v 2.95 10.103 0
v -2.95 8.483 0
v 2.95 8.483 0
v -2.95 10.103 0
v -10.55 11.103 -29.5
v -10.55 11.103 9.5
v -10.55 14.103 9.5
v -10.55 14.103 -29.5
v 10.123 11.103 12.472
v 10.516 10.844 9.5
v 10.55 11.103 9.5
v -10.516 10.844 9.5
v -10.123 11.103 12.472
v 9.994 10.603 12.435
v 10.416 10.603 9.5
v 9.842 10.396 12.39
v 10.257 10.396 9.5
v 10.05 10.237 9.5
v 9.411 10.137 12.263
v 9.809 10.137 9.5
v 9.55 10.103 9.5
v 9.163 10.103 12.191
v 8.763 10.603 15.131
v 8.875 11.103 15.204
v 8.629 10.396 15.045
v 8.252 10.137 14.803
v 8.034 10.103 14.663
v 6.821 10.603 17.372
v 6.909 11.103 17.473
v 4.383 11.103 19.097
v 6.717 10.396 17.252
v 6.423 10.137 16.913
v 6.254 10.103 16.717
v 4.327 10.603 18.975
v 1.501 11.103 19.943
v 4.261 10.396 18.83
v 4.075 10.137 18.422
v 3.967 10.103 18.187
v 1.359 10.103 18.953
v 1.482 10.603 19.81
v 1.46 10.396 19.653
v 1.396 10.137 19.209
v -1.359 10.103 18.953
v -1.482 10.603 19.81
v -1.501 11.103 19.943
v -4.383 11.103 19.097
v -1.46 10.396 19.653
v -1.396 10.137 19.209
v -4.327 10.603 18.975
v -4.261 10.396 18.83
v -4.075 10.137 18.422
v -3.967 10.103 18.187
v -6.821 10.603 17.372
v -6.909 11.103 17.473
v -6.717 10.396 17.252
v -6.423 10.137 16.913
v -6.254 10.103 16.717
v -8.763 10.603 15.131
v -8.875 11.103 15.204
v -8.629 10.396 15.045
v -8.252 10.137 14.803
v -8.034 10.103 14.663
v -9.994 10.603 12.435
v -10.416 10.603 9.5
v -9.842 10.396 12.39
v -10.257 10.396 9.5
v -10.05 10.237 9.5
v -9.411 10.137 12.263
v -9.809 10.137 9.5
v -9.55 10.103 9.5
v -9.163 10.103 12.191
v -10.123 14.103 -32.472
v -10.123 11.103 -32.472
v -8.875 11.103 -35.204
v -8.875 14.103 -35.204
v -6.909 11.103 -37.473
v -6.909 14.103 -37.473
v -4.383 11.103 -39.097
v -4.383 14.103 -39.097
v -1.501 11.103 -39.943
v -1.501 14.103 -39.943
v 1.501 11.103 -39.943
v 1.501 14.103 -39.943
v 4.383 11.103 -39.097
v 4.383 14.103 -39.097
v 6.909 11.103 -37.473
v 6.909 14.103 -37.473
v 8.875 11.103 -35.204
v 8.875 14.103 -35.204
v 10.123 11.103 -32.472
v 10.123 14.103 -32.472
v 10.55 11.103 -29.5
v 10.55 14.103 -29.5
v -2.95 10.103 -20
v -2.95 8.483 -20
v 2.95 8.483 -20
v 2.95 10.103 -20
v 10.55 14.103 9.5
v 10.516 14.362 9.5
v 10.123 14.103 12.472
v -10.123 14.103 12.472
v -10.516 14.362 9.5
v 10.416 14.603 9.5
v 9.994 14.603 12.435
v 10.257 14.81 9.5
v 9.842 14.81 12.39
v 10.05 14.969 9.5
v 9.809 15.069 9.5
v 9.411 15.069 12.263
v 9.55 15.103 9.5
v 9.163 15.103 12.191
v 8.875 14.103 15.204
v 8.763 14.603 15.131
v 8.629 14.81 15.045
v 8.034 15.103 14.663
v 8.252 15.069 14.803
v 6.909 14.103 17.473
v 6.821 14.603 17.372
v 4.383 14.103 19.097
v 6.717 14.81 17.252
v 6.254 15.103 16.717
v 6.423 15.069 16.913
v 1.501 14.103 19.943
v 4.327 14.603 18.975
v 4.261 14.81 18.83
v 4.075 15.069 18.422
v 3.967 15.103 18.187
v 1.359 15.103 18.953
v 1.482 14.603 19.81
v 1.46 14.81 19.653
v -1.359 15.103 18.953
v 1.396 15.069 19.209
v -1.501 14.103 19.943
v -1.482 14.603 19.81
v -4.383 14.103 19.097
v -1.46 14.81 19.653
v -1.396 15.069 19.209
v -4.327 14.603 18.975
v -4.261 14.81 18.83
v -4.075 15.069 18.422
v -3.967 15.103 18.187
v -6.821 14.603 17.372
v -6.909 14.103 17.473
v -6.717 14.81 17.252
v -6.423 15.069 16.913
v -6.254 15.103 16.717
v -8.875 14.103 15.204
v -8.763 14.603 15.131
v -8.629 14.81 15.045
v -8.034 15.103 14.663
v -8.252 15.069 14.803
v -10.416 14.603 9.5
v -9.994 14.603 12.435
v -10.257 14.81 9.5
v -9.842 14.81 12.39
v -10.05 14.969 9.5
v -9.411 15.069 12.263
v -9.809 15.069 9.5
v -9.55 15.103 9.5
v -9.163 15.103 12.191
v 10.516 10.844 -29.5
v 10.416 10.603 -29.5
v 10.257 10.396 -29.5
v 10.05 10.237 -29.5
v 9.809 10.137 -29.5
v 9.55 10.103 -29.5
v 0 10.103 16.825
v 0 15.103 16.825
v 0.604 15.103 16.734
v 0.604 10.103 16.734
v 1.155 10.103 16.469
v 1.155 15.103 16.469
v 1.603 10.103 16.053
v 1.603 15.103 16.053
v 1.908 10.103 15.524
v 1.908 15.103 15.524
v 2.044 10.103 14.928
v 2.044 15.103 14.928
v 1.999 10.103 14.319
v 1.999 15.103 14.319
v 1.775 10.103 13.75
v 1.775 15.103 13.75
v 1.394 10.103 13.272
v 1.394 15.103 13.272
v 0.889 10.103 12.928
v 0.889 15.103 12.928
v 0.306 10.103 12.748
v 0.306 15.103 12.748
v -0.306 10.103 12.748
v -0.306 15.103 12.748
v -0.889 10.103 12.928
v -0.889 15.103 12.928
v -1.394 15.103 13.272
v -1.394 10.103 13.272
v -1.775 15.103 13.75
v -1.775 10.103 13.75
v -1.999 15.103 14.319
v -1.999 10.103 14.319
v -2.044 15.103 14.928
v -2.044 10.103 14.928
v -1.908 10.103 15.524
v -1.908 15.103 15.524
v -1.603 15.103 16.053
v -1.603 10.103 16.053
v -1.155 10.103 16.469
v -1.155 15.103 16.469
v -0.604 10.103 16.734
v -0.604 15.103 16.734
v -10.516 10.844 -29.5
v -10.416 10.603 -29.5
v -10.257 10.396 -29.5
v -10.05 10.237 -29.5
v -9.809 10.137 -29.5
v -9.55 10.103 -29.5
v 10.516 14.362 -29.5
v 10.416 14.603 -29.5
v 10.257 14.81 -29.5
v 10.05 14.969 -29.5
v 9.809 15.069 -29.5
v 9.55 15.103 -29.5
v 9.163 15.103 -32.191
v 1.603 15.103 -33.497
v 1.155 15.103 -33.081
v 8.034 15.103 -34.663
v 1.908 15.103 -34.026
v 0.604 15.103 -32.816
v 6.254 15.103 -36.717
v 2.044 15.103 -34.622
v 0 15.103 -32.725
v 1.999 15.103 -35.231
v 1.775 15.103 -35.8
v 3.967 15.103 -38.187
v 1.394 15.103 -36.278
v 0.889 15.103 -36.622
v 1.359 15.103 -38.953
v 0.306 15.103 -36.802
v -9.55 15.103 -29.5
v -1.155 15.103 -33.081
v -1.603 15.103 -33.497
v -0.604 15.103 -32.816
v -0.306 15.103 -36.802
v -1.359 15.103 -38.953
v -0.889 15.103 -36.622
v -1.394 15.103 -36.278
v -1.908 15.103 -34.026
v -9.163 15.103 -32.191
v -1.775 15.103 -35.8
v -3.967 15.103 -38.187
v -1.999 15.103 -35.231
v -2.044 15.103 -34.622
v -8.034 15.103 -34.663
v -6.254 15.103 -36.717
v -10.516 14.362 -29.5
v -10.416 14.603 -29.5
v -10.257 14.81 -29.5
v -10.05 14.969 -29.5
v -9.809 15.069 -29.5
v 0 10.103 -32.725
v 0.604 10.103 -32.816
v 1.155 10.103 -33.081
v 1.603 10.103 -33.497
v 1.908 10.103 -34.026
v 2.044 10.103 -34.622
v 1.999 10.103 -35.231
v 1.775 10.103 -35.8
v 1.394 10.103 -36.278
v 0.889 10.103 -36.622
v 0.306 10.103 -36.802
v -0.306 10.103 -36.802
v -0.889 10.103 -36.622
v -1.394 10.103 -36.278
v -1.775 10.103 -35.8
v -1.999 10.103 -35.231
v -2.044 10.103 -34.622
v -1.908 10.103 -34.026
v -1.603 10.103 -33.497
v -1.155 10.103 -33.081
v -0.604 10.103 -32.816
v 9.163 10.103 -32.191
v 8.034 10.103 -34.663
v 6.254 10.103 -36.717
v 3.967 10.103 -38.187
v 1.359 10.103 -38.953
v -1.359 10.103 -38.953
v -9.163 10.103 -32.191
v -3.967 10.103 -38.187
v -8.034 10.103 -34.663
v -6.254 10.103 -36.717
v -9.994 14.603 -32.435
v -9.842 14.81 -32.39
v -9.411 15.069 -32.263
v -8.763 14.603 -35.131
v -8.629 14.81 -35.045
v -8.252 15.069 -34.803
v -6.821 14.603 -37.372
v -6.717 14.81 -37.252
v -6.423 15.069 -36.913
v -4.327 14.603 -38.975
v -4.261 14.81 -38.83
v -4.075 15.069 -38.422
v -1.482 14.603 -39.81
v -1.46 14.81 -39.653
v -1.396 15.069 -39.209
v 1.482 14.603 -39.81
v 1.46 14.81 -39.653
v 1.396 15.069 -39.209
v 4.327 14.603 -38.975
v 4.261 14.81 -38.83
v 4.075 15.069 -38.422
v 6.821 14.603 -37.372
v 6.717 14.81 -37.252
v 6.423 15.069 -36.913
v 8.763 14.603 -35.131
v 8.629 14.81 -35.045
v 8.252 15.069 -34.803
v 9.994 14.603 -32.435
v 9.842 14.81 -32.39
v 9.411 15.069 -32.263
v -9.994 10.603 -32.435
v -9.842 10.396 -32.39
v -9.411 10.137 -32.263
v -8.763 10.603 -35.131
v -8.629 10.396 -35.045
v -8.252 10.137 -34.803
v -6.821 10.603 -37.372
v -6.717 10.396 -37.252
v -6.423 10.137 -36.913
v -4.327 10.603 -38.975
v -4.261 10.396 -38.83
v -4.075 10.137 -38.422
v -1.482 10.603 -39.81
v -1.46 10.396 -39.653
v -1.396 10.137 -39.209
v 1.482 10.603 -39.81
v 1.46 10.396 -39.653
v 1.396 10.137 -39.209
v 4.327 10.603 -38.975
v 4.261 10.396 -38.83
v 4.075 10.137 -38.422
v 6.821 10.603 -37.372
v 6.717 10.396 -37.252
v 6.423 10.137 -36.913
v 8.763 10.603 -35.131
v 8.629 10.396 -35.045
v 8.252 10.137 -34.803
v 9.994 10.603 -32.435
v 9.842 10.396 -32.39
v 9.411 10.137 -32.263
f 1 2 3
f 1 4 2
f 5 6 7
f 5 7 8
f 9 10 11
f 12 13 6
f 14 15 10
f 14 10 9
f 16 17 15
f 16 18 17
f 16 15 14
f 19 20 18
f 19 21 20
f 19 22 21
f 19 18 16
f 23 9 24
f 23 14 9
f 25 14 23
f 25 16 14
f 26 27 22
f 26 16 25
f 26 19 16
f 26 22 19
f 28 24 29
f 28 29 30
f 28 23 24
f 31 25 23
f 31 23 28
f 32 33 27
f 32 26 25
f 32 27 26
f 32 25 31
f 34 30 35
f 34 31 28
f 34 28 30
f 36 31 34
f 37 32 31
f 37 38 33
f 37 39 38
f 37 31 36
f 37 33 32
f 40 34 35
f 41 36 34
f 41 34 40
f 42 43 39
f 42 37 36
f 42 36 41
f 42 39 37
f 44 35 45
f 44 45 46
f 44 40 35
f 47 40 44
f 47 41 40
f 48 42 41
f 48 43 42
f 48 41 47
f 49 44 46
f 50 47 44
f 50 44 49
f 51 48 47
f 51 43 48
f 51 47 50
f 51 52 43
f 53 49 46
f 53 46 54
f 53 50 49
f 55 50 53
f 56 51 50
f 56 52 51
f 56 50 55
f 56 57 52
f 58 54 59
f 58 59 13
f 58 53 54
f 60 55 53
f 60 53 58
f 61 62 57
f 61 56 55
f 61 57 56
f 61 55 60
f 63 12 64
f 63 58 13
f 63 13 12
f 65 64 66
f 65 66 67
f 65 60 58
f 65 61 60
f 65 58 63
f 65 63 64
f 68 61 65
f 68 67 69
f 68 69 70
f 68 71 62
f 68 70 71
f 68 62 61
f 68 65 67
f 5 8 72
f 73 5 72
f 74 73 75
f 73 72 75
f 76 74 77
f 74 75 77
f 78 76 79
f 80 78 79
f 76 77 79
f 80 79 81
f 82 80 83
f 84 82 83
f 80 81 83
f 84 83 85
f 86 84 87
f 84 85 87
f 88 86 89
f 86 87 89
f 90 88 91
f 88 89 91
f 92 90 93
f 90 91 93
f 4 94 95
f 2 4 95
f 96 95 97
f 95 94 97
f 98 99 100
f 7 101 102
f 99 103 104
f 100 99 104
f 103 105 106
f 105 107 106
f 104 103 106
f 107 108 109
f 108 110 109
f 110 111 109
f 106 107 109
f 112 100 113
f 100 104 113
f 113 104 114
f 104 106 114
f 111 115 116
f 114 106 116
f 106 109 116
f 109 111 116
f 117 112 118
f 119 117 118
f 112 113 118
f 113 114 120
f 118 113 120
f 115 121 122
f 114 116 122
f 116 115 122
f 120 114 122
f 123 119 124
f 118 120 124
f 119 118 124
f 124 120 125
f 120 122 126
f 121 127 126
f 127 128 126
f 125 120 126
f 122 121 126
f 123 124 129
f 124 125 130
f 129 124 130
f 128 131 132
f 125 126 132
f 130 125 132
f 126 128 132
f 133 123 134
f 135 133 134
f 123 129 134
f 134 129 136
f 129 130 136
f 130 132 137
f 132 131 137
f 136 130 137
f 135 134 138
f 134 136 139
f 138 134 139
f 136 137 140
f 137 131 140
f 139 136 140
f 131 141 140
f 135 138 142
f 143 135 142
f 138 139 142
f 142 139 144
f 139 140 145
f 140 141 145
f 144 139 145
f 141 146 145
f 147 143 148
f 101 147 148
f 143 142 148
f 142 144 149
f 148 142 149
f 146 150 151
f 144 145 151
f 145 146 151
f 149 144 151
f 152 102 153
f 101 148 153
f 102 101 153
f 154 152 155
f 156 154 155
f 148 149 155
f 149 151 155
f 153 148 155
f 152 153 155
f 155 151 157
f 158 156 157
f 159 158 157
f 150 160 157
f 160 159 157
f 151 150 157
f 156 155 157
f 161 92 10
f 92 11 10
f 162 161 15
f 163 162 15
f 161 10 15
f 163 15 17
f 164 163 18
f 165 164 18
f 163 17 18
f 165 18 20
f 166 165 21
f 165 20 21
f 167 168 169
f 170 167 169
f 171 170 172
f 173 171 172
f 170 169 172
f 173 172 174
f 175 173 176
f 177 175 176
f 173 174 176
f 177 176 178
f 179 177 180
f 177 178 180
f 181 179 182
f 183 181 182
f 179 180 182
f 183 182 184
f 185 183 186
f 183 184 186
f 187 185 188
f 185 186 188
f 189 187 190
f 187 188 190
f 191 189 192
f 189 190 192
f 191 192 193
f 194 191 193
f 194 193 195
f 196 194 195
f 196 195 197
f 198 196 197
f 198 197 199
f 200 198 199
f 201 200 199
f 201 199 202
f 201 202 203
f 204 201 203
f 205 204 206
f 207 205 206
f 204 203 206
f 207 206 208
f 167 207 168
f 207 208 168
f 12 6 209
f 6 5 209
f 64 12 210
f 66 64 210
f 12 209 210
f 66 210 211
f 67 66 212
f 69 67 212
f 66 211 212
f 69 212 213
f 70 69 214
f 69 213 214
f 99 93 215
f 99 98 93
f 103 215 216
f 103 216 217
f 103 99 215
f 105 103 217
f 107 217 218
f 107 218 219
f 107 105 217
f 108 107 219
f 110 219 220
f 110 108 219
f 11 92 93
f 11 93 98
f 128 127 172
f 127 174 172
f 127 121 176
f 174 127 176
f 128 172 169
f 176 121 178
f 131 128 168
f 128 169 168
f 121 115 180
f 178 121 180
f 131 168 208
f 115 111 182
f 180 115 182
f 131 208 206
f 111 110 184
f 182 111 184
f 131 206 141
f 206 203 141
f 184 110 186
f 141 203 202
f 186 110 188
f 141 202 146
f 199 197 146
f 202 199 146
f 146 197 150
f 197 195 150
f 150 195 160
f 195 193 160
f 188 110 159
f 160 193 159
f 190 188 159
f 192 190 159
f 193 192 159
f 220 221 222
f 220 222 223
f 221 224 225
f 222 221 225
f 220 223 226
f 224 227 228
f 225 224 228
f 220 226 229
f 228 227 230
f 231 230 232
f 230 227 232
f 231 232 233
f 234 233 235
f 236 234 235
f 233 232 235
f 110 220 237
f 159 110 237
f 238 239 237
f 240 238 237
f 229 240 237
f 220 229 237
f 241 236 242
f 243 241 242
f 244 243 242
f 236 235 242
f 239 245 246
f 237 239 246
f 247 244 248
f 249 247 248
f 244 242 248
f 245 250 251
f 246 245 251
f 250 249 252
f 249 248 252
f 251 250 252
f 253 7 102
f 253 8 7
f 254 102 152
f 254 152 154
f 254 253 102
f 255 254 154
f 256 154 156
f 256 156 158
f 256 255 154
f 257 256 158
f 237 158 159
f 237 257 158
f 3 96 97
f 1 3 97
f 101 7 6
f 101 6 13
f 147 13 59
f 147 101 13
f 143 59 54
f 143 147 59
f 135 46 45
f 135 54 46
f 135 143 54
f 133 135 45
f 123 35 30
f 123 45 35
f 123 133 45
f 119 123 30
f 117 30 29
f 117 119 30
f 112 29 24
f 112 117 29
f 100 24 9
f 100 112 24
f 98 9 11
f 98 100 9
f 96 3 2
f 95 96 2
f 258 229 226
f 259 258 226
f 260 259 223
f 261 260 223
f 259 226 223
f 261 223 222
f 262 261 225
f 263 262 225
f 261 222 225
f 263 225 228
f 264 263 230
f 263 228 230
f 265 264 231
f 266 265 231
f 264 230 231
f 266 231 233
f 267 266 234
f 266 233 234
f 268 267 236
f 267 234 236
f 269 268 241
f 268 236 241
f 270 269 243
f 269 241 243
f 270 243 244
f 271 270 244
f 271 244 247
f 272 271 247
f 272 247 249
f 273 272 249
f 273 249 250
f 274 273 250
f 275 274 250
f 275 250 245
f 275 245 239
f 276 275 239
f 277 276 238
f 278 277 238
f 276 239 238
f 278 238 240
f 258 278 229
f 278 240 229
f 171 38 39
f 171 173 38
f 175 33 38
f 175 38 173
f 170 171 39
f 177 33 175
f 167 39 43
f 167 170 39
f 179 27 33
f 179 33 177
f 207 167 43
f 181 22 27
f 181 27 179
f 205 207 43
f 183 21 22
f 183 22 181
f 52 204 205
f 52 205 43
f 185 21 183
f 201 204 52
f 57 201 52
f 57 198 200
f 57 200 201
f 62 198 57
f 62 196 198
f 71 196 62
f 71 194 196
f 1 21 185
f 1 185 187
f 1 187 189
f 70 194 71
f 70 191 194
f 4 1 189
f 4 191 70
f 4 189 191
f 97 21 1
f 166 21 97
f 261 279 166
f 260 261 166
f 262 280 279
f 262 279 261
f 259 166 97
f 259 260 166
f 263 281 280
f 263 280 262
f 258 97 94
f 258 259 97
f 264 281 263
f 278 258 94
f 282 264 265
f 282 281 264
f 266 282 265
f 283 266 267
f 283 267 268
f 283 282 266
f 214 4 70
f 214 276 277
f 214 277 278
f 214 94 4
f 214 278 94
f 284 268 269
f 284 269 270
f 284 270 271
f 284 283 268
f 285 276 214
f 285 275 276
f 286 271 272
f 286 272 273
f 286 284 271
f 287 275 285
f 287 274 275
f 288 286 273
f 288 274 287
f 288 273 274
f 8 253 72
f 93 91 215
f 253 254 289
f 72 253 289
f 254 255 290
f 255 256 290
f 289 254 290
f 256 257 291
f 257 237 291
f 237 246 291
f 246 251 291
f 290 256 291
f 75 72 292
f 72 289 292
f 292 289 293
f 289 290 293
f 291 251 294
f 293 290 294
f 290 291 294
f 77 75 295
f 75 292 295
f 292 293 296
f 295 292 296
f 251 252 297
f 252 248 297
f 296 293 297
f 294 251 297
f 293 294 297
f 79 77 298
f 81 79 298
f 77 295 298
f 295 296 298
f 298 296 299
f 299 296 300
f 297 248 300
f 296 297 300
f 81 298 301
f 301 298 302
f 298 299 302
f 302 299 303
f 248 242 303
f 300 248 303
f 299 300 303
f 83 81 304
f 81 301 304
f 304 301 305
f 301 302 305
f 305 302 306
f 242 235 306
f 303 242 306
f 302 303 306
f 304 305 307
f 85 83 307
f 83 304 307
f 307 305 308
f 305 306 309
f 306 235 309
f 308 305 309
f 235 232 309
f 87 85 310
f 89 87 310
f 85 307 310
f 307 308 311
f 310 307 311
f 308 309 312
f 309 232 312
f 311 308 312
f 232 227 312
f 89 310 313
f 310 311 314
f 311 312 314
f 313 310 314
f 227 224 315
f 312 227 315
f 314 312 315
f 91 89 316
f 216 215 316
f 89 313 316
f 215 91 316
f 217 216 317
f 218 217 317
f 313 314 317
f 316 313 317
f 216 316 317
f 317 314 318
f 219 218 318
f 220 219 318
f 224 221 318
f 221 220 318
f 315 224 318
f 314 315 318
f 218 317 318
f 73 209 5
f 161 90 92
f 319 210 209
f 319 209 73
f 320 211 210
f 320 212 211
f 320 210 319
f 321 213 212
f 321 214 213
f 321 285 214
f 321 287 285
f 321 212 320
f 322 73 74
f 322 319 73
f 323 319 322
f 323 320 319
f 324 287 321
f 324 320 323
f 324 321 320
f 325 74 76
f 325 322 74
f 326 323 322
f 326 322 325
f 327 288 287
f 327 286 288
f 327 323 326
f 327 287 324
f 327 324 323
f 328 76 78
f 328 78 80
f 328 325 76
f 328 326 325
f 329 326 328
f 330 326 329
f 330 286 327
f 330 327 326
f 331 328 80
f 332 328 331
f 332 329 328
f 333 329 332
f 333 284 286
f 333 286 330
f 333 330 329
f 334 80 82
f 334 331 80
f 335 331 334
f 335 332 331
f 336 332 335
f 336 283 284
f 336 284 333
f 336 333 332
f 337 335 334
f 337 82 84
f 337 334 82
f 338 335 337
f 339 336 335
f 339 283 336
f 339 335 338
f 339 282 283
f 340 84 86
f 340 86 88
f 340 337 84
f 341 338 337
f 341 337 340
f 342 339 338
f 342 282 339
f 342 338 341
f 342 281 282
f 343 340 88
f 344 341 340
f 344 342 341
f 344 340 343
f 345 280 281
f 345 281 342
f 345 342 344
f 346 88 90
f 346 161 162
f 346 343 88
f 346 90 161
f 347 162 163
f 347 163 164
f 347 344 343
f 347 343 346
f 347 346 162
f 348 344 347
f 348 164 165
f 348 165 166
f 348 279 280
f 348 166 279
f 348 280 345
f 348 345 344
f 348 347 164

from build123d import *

# Parameters (mm, degrees)
BOSS_EXTRU_1_DEPTH      = 20
CONG_1_R                = 0.5
CONG_2_R                = 1
BOSS_EXTRU_2_DEPTH      = 5
ENL_V_MAT_EXTRU_1_DEPTH = 35.78012648597392
ESQUISSE6_R             = 2.0500000000000007
ESQUISSE6_R_2           = 2.05
BOSS_EXTRU_3_DEPTH      = 5
CONG_4_R                = 1


with BuildPart() as part:
    # Esquisse1 → Boss.-Extru.1 (new body)
    with BuildSketch(Plane.XY):
        Polygon((-1.176e-14, 10.103135382441117), (-2.578e-14, 4.840000000000001), (3.5, 4.840000000000001), (5.71, 6.983135382441116), (5.71, 8.483135382441116), (2.95, 8.483135382441116), (2.95, 10.103135382441117), align=None)
        Polygon((-3.5, 4.840000000000001), (-2.576e-14, 4.840000000000001), (-1.176e-14, 10.103135382441117), (-2.95, 10.103135382441117), (-2.95, 8.483135382441116), (-5.71, 8.483135382441116), (-5.71, 6.983135382441116), align=None)
    extrude(amount=-BOSS_EXTRU_1_DEPTH)

    # Congé1
    cong_1_edges = [part.edges().sort_by_distance(p)[0] for p in [
        (5.71, 7.733135382441116, 0),
        (4.605, 5.911567691220558, 0),
        (0, 4.840000000000001, 0),
        (-4.605, 5.911567691220558, 0),
        (-5.71, 7.733135382441116, 0),
        (-5.71, 7.733135382441116, -20),
        (-4.605, 5.911567691220558, -20),
        (0, 4.840000000000001, -20),
        (4.605, 5.911567691220558, -20),
        (5.71, 7.733135382441116, -20),
    ]]
    fillet(cong_1_edges, radius=CONG_1_R)

    # Congé2
    # the kernel refuses this fillet: 1 mm, written as the material it takes off along each edge
    with BuildSketch(Plane(origin=(4.71, 7.4063748668930085, -20), x_dir=(1, 0, 0), z_dir=(0, 1, 0))) as cong_2_piece_1:
        with BuildLine():
            CenterArc((0.5, -0.5), 0.5, 0, 90)
            Line((1, -0.5), (1, 0))
            Line((1, 0), (0.5, 0))
        make_face()
    revolve(axis=Axis((4.71, 7.4063748668930085, -20), (0, 0, -1)), revolution_arc=45.87999999999987, mode=Mode.SUBTRACT)
    with BuildSketch(Plane(origin=(-4.710000000000001, 7.40637486689301, -20), x_dir=(-0.6961634275566162, -0.717883334625219, 0), z_dir=(0.717883334625219, -0.6961634275566162, 0))) as cong_2_piece_2:
        with BuildLine():
            CenterArc((0.5, -0.5), 0.5, 0, 90)
            Line((1, -0.5), (1, 0))
            Line((1, 0), (0.5, 0))
        make_face()
    revolve(axis=Axis((-4.710000000000001, 7.40637486689301, -20), (0, 0, -1)), revolution_arc=45.87999999999987, mode=Mode.SUBTRACT)
    with BuildSketch(Plane(origin=(4.71, 7.4063748668930085, 0), x_dir=(0.6961634275566162, -0.717883334625219, 0), z_dir=(-0.717883334625219, -0.6961634275566162, 0))) as cong_2_piece_3:
        with BuildLine():
            CenterArc((0.5, -0.5), 0.5, 0, 90)
            Line((1, -0.5), (1, 0))
            Line((1, 0), (0.5, 0))
        make_face()
    revolve(axis=Axis((4.71, 7.4063748668930085, 0), (0, 0, 1)), revolution_arc=45.87999999999987, mode=Mode.SUBTRACT)
    with BuildSketch(Plane(origin=(-4.710000000000001, 7.40637486689301, 0), x_dir=(-1, 0, 0), z_dir=(0, 1, 0))) as cong_2_piece_4:
        with BuildLine():
            CenterArc((0.5, -0.5), 0.5, 0, 90)
            Line((1, -0.5), (1, 0))
            Line((1, 0), (0.5, 0))
        make_face()
    revolve(axis=Axis((-4.710000000000001, 7.40637486689301, 0), (0, 0, 1)), revolution_arc=45.87999999999987, mode=Mode.SUBTRACT)
    with BuildSketch(Plane(origin=(-5.71, 6.983135382441116, 1.1e-16), x_dir=(0.717883334625219, -0.6961634275566161, 0), z_dir=(0, 0, -1))) as cong_2_piece_5:
        with BuildLine():
            CenterArc((CONG_2_R * 0.423239484452, -CONG_2_R), CONG_2_R, 90.00000000000003, 45.879999999999825)
            Line((-CONG_2_R * 0.294643850173, -CONG_2_R * 0.303836572443), (0, 0))
            Line((0, 0), (CONG_2_R * 0.423239484452, 0))
        make_face()
    extrude(amount=20, mode=Mode.SUBTRACT)
    with BuildSketch(Plane(origin=(5.71, 6.983135382441116, 1.1e-16), x_dir=(-0.7178833346252179, -0.6961634275566172, 0), z_dir=(0, 0, -1))) as cong_2_piece_6:
        with BuildLine():
            CenterArc((CONG_2_R * 0.423239484452, CONG_2_R), CONG_2_R, 224.12000000000015, 45.87999999999994)
            Line((-CONG_2_R * 0.294643850173, CONG_2_R * 0.303836572443), (0, 0))
            Line((0, 0), (CONG_2_R * 0.423239484452, 2e-17))
        make_face()
    extrude(amount=20, mode=Mode.SUBTRACT)

    # Esquisse3 → Boss.-Extru.2 (add)
    with BuildSketch(Plane(origin=(0, 10.103135382441117, 0), x_dir=(1, 0, 0), z_dir=(0, 1, 0))):
        Polygon((-10.550000000000004, 29.5), (10.549999999999994, 29.5), (10.55, -9.500000000000002), (-10.55, -9.500000000000002), align=None)
    extrude(amount=BOSS_EXTRU_2_DEPTH)

    # Esquisse5 → Enlèv. mat.-Extru.1 (cut, through all)
    with BuildSketch(Plane.XY):
        with BuildLine():
            Line((-5.209999999999999, 8.483135382441116), (-5.71, 8.483135382441116))
            Line((-5.71, 8.483135382441116), (-5.71, 7.4063748668930085))
            ThreePointArc((-5.71, 7.4063748668930085), (-5.630913521335368, 7.01660790289825), (-5.406163427556616, 6.68849153226779))
            Line((-5.406163427556616, 6.68849153226779), (-3.5, 4.840000000000001))
            Line((-3.5, 4.840000000000001), (3.5, 4.840000000000001))
            Line((3.5, 4.840000000000001), (5.406163427556617, 6.68849153226779))
            ThreePointArc((5.406163427556617, 6.68849153226779), (5.630913521335369, 7.01660790289825), (5.71, 7.406374866893009))
            Line((5.71, 7.406374866893009), (5.71, 8.483135382441116))
            Line((5.71, 8.483135382441116), (5.209999999999999, 8.483135382441116))
            Line((5.209999999999999, 8.483135382441116), (2.95, 8.483135382441116))
            Line((2.95, 8.483135382441116), (-2.95, 8.483135382441116))
            Line((-2.95, 8.483135382441116), (-5.209999999999999, 8.483135382441116))
        make_face()
    extrude(amount=-ENL_V_MAT_EXTRU_1_DEPTH, mode=Mode.SUBTRACT)

    # Esquisse6 → Boss.-Extru.3 (add)
    # profile 1 of 2: a face of its own
    with BuildSketch(Plane(origin=(0, 15.103135382441117, 0), x_dir=(1, 0, 0), z_dir=(0, 1, 0))):
        with BuildLine():
            ThreePointArc((-10.550000000000004, 29.5), (-4.56e-15, 40.05), (10.549999999999994, 29.5))
            Line((10.549999999999994, 29.5), (-10.550000000000004, 29.5))
        make_face()
        with Locations(Location((-5.53e-15, 34.775, 0), (0, 0, 270))):
            Circle(ESQUISSE6_R, mode=Mode.SUBTRACT)
    # profile 2 of 2: a face of its own
    with BuildSketch(Plane(origin=(0, 15.103135382441117, 0), x_dir=(1, 0, 0), z_dir=(0, 1, 0))):
        with BuildLine():
            ThreePointArc((-10.55, -9.500000000000002), (-1.94e-15, -20.050000000000004), (10.55, -9.500000000000002))
            Line((10.55, -9.500000000000002), (-10.55, -9.500000000000002))
        make_face()
        with Locations(Location((-9.7e-16, -14.775000000000002, 0), (0, 0, 270))):
            Circle(ESQUISSE6_R_2, mode=Mode.SUBTRACT)
    extrude(amount=-BOSS_EXTRU_3_DEPTH)

    # Congé4
    cong_4_edges = [part.edges().sort_by_distance(p)[0] for p in [
        (10.549999999999997, 10.103135382441117, -10),
        (-10.550000000000002, 10.103135382441117, -9.999999999999998),
        (10.549999999999997, 15.103135382441117, -10),
        (-10.550000000000002, 15.103135382441117, -9.999999999999998),
        (-8.32e-15, 15.103135382441117, -40.05),
        (-8.32e-15, 10.103135382441117, -40.05),
        (3.15e-15, 10.103135382441117, 20.050000000000004),
        (3.15e-15, 15.103135382441117, 20.050000000000004),
    ]]
    fillet(cong_4_edges, radius=CONG_4_R)


solid = part.part
